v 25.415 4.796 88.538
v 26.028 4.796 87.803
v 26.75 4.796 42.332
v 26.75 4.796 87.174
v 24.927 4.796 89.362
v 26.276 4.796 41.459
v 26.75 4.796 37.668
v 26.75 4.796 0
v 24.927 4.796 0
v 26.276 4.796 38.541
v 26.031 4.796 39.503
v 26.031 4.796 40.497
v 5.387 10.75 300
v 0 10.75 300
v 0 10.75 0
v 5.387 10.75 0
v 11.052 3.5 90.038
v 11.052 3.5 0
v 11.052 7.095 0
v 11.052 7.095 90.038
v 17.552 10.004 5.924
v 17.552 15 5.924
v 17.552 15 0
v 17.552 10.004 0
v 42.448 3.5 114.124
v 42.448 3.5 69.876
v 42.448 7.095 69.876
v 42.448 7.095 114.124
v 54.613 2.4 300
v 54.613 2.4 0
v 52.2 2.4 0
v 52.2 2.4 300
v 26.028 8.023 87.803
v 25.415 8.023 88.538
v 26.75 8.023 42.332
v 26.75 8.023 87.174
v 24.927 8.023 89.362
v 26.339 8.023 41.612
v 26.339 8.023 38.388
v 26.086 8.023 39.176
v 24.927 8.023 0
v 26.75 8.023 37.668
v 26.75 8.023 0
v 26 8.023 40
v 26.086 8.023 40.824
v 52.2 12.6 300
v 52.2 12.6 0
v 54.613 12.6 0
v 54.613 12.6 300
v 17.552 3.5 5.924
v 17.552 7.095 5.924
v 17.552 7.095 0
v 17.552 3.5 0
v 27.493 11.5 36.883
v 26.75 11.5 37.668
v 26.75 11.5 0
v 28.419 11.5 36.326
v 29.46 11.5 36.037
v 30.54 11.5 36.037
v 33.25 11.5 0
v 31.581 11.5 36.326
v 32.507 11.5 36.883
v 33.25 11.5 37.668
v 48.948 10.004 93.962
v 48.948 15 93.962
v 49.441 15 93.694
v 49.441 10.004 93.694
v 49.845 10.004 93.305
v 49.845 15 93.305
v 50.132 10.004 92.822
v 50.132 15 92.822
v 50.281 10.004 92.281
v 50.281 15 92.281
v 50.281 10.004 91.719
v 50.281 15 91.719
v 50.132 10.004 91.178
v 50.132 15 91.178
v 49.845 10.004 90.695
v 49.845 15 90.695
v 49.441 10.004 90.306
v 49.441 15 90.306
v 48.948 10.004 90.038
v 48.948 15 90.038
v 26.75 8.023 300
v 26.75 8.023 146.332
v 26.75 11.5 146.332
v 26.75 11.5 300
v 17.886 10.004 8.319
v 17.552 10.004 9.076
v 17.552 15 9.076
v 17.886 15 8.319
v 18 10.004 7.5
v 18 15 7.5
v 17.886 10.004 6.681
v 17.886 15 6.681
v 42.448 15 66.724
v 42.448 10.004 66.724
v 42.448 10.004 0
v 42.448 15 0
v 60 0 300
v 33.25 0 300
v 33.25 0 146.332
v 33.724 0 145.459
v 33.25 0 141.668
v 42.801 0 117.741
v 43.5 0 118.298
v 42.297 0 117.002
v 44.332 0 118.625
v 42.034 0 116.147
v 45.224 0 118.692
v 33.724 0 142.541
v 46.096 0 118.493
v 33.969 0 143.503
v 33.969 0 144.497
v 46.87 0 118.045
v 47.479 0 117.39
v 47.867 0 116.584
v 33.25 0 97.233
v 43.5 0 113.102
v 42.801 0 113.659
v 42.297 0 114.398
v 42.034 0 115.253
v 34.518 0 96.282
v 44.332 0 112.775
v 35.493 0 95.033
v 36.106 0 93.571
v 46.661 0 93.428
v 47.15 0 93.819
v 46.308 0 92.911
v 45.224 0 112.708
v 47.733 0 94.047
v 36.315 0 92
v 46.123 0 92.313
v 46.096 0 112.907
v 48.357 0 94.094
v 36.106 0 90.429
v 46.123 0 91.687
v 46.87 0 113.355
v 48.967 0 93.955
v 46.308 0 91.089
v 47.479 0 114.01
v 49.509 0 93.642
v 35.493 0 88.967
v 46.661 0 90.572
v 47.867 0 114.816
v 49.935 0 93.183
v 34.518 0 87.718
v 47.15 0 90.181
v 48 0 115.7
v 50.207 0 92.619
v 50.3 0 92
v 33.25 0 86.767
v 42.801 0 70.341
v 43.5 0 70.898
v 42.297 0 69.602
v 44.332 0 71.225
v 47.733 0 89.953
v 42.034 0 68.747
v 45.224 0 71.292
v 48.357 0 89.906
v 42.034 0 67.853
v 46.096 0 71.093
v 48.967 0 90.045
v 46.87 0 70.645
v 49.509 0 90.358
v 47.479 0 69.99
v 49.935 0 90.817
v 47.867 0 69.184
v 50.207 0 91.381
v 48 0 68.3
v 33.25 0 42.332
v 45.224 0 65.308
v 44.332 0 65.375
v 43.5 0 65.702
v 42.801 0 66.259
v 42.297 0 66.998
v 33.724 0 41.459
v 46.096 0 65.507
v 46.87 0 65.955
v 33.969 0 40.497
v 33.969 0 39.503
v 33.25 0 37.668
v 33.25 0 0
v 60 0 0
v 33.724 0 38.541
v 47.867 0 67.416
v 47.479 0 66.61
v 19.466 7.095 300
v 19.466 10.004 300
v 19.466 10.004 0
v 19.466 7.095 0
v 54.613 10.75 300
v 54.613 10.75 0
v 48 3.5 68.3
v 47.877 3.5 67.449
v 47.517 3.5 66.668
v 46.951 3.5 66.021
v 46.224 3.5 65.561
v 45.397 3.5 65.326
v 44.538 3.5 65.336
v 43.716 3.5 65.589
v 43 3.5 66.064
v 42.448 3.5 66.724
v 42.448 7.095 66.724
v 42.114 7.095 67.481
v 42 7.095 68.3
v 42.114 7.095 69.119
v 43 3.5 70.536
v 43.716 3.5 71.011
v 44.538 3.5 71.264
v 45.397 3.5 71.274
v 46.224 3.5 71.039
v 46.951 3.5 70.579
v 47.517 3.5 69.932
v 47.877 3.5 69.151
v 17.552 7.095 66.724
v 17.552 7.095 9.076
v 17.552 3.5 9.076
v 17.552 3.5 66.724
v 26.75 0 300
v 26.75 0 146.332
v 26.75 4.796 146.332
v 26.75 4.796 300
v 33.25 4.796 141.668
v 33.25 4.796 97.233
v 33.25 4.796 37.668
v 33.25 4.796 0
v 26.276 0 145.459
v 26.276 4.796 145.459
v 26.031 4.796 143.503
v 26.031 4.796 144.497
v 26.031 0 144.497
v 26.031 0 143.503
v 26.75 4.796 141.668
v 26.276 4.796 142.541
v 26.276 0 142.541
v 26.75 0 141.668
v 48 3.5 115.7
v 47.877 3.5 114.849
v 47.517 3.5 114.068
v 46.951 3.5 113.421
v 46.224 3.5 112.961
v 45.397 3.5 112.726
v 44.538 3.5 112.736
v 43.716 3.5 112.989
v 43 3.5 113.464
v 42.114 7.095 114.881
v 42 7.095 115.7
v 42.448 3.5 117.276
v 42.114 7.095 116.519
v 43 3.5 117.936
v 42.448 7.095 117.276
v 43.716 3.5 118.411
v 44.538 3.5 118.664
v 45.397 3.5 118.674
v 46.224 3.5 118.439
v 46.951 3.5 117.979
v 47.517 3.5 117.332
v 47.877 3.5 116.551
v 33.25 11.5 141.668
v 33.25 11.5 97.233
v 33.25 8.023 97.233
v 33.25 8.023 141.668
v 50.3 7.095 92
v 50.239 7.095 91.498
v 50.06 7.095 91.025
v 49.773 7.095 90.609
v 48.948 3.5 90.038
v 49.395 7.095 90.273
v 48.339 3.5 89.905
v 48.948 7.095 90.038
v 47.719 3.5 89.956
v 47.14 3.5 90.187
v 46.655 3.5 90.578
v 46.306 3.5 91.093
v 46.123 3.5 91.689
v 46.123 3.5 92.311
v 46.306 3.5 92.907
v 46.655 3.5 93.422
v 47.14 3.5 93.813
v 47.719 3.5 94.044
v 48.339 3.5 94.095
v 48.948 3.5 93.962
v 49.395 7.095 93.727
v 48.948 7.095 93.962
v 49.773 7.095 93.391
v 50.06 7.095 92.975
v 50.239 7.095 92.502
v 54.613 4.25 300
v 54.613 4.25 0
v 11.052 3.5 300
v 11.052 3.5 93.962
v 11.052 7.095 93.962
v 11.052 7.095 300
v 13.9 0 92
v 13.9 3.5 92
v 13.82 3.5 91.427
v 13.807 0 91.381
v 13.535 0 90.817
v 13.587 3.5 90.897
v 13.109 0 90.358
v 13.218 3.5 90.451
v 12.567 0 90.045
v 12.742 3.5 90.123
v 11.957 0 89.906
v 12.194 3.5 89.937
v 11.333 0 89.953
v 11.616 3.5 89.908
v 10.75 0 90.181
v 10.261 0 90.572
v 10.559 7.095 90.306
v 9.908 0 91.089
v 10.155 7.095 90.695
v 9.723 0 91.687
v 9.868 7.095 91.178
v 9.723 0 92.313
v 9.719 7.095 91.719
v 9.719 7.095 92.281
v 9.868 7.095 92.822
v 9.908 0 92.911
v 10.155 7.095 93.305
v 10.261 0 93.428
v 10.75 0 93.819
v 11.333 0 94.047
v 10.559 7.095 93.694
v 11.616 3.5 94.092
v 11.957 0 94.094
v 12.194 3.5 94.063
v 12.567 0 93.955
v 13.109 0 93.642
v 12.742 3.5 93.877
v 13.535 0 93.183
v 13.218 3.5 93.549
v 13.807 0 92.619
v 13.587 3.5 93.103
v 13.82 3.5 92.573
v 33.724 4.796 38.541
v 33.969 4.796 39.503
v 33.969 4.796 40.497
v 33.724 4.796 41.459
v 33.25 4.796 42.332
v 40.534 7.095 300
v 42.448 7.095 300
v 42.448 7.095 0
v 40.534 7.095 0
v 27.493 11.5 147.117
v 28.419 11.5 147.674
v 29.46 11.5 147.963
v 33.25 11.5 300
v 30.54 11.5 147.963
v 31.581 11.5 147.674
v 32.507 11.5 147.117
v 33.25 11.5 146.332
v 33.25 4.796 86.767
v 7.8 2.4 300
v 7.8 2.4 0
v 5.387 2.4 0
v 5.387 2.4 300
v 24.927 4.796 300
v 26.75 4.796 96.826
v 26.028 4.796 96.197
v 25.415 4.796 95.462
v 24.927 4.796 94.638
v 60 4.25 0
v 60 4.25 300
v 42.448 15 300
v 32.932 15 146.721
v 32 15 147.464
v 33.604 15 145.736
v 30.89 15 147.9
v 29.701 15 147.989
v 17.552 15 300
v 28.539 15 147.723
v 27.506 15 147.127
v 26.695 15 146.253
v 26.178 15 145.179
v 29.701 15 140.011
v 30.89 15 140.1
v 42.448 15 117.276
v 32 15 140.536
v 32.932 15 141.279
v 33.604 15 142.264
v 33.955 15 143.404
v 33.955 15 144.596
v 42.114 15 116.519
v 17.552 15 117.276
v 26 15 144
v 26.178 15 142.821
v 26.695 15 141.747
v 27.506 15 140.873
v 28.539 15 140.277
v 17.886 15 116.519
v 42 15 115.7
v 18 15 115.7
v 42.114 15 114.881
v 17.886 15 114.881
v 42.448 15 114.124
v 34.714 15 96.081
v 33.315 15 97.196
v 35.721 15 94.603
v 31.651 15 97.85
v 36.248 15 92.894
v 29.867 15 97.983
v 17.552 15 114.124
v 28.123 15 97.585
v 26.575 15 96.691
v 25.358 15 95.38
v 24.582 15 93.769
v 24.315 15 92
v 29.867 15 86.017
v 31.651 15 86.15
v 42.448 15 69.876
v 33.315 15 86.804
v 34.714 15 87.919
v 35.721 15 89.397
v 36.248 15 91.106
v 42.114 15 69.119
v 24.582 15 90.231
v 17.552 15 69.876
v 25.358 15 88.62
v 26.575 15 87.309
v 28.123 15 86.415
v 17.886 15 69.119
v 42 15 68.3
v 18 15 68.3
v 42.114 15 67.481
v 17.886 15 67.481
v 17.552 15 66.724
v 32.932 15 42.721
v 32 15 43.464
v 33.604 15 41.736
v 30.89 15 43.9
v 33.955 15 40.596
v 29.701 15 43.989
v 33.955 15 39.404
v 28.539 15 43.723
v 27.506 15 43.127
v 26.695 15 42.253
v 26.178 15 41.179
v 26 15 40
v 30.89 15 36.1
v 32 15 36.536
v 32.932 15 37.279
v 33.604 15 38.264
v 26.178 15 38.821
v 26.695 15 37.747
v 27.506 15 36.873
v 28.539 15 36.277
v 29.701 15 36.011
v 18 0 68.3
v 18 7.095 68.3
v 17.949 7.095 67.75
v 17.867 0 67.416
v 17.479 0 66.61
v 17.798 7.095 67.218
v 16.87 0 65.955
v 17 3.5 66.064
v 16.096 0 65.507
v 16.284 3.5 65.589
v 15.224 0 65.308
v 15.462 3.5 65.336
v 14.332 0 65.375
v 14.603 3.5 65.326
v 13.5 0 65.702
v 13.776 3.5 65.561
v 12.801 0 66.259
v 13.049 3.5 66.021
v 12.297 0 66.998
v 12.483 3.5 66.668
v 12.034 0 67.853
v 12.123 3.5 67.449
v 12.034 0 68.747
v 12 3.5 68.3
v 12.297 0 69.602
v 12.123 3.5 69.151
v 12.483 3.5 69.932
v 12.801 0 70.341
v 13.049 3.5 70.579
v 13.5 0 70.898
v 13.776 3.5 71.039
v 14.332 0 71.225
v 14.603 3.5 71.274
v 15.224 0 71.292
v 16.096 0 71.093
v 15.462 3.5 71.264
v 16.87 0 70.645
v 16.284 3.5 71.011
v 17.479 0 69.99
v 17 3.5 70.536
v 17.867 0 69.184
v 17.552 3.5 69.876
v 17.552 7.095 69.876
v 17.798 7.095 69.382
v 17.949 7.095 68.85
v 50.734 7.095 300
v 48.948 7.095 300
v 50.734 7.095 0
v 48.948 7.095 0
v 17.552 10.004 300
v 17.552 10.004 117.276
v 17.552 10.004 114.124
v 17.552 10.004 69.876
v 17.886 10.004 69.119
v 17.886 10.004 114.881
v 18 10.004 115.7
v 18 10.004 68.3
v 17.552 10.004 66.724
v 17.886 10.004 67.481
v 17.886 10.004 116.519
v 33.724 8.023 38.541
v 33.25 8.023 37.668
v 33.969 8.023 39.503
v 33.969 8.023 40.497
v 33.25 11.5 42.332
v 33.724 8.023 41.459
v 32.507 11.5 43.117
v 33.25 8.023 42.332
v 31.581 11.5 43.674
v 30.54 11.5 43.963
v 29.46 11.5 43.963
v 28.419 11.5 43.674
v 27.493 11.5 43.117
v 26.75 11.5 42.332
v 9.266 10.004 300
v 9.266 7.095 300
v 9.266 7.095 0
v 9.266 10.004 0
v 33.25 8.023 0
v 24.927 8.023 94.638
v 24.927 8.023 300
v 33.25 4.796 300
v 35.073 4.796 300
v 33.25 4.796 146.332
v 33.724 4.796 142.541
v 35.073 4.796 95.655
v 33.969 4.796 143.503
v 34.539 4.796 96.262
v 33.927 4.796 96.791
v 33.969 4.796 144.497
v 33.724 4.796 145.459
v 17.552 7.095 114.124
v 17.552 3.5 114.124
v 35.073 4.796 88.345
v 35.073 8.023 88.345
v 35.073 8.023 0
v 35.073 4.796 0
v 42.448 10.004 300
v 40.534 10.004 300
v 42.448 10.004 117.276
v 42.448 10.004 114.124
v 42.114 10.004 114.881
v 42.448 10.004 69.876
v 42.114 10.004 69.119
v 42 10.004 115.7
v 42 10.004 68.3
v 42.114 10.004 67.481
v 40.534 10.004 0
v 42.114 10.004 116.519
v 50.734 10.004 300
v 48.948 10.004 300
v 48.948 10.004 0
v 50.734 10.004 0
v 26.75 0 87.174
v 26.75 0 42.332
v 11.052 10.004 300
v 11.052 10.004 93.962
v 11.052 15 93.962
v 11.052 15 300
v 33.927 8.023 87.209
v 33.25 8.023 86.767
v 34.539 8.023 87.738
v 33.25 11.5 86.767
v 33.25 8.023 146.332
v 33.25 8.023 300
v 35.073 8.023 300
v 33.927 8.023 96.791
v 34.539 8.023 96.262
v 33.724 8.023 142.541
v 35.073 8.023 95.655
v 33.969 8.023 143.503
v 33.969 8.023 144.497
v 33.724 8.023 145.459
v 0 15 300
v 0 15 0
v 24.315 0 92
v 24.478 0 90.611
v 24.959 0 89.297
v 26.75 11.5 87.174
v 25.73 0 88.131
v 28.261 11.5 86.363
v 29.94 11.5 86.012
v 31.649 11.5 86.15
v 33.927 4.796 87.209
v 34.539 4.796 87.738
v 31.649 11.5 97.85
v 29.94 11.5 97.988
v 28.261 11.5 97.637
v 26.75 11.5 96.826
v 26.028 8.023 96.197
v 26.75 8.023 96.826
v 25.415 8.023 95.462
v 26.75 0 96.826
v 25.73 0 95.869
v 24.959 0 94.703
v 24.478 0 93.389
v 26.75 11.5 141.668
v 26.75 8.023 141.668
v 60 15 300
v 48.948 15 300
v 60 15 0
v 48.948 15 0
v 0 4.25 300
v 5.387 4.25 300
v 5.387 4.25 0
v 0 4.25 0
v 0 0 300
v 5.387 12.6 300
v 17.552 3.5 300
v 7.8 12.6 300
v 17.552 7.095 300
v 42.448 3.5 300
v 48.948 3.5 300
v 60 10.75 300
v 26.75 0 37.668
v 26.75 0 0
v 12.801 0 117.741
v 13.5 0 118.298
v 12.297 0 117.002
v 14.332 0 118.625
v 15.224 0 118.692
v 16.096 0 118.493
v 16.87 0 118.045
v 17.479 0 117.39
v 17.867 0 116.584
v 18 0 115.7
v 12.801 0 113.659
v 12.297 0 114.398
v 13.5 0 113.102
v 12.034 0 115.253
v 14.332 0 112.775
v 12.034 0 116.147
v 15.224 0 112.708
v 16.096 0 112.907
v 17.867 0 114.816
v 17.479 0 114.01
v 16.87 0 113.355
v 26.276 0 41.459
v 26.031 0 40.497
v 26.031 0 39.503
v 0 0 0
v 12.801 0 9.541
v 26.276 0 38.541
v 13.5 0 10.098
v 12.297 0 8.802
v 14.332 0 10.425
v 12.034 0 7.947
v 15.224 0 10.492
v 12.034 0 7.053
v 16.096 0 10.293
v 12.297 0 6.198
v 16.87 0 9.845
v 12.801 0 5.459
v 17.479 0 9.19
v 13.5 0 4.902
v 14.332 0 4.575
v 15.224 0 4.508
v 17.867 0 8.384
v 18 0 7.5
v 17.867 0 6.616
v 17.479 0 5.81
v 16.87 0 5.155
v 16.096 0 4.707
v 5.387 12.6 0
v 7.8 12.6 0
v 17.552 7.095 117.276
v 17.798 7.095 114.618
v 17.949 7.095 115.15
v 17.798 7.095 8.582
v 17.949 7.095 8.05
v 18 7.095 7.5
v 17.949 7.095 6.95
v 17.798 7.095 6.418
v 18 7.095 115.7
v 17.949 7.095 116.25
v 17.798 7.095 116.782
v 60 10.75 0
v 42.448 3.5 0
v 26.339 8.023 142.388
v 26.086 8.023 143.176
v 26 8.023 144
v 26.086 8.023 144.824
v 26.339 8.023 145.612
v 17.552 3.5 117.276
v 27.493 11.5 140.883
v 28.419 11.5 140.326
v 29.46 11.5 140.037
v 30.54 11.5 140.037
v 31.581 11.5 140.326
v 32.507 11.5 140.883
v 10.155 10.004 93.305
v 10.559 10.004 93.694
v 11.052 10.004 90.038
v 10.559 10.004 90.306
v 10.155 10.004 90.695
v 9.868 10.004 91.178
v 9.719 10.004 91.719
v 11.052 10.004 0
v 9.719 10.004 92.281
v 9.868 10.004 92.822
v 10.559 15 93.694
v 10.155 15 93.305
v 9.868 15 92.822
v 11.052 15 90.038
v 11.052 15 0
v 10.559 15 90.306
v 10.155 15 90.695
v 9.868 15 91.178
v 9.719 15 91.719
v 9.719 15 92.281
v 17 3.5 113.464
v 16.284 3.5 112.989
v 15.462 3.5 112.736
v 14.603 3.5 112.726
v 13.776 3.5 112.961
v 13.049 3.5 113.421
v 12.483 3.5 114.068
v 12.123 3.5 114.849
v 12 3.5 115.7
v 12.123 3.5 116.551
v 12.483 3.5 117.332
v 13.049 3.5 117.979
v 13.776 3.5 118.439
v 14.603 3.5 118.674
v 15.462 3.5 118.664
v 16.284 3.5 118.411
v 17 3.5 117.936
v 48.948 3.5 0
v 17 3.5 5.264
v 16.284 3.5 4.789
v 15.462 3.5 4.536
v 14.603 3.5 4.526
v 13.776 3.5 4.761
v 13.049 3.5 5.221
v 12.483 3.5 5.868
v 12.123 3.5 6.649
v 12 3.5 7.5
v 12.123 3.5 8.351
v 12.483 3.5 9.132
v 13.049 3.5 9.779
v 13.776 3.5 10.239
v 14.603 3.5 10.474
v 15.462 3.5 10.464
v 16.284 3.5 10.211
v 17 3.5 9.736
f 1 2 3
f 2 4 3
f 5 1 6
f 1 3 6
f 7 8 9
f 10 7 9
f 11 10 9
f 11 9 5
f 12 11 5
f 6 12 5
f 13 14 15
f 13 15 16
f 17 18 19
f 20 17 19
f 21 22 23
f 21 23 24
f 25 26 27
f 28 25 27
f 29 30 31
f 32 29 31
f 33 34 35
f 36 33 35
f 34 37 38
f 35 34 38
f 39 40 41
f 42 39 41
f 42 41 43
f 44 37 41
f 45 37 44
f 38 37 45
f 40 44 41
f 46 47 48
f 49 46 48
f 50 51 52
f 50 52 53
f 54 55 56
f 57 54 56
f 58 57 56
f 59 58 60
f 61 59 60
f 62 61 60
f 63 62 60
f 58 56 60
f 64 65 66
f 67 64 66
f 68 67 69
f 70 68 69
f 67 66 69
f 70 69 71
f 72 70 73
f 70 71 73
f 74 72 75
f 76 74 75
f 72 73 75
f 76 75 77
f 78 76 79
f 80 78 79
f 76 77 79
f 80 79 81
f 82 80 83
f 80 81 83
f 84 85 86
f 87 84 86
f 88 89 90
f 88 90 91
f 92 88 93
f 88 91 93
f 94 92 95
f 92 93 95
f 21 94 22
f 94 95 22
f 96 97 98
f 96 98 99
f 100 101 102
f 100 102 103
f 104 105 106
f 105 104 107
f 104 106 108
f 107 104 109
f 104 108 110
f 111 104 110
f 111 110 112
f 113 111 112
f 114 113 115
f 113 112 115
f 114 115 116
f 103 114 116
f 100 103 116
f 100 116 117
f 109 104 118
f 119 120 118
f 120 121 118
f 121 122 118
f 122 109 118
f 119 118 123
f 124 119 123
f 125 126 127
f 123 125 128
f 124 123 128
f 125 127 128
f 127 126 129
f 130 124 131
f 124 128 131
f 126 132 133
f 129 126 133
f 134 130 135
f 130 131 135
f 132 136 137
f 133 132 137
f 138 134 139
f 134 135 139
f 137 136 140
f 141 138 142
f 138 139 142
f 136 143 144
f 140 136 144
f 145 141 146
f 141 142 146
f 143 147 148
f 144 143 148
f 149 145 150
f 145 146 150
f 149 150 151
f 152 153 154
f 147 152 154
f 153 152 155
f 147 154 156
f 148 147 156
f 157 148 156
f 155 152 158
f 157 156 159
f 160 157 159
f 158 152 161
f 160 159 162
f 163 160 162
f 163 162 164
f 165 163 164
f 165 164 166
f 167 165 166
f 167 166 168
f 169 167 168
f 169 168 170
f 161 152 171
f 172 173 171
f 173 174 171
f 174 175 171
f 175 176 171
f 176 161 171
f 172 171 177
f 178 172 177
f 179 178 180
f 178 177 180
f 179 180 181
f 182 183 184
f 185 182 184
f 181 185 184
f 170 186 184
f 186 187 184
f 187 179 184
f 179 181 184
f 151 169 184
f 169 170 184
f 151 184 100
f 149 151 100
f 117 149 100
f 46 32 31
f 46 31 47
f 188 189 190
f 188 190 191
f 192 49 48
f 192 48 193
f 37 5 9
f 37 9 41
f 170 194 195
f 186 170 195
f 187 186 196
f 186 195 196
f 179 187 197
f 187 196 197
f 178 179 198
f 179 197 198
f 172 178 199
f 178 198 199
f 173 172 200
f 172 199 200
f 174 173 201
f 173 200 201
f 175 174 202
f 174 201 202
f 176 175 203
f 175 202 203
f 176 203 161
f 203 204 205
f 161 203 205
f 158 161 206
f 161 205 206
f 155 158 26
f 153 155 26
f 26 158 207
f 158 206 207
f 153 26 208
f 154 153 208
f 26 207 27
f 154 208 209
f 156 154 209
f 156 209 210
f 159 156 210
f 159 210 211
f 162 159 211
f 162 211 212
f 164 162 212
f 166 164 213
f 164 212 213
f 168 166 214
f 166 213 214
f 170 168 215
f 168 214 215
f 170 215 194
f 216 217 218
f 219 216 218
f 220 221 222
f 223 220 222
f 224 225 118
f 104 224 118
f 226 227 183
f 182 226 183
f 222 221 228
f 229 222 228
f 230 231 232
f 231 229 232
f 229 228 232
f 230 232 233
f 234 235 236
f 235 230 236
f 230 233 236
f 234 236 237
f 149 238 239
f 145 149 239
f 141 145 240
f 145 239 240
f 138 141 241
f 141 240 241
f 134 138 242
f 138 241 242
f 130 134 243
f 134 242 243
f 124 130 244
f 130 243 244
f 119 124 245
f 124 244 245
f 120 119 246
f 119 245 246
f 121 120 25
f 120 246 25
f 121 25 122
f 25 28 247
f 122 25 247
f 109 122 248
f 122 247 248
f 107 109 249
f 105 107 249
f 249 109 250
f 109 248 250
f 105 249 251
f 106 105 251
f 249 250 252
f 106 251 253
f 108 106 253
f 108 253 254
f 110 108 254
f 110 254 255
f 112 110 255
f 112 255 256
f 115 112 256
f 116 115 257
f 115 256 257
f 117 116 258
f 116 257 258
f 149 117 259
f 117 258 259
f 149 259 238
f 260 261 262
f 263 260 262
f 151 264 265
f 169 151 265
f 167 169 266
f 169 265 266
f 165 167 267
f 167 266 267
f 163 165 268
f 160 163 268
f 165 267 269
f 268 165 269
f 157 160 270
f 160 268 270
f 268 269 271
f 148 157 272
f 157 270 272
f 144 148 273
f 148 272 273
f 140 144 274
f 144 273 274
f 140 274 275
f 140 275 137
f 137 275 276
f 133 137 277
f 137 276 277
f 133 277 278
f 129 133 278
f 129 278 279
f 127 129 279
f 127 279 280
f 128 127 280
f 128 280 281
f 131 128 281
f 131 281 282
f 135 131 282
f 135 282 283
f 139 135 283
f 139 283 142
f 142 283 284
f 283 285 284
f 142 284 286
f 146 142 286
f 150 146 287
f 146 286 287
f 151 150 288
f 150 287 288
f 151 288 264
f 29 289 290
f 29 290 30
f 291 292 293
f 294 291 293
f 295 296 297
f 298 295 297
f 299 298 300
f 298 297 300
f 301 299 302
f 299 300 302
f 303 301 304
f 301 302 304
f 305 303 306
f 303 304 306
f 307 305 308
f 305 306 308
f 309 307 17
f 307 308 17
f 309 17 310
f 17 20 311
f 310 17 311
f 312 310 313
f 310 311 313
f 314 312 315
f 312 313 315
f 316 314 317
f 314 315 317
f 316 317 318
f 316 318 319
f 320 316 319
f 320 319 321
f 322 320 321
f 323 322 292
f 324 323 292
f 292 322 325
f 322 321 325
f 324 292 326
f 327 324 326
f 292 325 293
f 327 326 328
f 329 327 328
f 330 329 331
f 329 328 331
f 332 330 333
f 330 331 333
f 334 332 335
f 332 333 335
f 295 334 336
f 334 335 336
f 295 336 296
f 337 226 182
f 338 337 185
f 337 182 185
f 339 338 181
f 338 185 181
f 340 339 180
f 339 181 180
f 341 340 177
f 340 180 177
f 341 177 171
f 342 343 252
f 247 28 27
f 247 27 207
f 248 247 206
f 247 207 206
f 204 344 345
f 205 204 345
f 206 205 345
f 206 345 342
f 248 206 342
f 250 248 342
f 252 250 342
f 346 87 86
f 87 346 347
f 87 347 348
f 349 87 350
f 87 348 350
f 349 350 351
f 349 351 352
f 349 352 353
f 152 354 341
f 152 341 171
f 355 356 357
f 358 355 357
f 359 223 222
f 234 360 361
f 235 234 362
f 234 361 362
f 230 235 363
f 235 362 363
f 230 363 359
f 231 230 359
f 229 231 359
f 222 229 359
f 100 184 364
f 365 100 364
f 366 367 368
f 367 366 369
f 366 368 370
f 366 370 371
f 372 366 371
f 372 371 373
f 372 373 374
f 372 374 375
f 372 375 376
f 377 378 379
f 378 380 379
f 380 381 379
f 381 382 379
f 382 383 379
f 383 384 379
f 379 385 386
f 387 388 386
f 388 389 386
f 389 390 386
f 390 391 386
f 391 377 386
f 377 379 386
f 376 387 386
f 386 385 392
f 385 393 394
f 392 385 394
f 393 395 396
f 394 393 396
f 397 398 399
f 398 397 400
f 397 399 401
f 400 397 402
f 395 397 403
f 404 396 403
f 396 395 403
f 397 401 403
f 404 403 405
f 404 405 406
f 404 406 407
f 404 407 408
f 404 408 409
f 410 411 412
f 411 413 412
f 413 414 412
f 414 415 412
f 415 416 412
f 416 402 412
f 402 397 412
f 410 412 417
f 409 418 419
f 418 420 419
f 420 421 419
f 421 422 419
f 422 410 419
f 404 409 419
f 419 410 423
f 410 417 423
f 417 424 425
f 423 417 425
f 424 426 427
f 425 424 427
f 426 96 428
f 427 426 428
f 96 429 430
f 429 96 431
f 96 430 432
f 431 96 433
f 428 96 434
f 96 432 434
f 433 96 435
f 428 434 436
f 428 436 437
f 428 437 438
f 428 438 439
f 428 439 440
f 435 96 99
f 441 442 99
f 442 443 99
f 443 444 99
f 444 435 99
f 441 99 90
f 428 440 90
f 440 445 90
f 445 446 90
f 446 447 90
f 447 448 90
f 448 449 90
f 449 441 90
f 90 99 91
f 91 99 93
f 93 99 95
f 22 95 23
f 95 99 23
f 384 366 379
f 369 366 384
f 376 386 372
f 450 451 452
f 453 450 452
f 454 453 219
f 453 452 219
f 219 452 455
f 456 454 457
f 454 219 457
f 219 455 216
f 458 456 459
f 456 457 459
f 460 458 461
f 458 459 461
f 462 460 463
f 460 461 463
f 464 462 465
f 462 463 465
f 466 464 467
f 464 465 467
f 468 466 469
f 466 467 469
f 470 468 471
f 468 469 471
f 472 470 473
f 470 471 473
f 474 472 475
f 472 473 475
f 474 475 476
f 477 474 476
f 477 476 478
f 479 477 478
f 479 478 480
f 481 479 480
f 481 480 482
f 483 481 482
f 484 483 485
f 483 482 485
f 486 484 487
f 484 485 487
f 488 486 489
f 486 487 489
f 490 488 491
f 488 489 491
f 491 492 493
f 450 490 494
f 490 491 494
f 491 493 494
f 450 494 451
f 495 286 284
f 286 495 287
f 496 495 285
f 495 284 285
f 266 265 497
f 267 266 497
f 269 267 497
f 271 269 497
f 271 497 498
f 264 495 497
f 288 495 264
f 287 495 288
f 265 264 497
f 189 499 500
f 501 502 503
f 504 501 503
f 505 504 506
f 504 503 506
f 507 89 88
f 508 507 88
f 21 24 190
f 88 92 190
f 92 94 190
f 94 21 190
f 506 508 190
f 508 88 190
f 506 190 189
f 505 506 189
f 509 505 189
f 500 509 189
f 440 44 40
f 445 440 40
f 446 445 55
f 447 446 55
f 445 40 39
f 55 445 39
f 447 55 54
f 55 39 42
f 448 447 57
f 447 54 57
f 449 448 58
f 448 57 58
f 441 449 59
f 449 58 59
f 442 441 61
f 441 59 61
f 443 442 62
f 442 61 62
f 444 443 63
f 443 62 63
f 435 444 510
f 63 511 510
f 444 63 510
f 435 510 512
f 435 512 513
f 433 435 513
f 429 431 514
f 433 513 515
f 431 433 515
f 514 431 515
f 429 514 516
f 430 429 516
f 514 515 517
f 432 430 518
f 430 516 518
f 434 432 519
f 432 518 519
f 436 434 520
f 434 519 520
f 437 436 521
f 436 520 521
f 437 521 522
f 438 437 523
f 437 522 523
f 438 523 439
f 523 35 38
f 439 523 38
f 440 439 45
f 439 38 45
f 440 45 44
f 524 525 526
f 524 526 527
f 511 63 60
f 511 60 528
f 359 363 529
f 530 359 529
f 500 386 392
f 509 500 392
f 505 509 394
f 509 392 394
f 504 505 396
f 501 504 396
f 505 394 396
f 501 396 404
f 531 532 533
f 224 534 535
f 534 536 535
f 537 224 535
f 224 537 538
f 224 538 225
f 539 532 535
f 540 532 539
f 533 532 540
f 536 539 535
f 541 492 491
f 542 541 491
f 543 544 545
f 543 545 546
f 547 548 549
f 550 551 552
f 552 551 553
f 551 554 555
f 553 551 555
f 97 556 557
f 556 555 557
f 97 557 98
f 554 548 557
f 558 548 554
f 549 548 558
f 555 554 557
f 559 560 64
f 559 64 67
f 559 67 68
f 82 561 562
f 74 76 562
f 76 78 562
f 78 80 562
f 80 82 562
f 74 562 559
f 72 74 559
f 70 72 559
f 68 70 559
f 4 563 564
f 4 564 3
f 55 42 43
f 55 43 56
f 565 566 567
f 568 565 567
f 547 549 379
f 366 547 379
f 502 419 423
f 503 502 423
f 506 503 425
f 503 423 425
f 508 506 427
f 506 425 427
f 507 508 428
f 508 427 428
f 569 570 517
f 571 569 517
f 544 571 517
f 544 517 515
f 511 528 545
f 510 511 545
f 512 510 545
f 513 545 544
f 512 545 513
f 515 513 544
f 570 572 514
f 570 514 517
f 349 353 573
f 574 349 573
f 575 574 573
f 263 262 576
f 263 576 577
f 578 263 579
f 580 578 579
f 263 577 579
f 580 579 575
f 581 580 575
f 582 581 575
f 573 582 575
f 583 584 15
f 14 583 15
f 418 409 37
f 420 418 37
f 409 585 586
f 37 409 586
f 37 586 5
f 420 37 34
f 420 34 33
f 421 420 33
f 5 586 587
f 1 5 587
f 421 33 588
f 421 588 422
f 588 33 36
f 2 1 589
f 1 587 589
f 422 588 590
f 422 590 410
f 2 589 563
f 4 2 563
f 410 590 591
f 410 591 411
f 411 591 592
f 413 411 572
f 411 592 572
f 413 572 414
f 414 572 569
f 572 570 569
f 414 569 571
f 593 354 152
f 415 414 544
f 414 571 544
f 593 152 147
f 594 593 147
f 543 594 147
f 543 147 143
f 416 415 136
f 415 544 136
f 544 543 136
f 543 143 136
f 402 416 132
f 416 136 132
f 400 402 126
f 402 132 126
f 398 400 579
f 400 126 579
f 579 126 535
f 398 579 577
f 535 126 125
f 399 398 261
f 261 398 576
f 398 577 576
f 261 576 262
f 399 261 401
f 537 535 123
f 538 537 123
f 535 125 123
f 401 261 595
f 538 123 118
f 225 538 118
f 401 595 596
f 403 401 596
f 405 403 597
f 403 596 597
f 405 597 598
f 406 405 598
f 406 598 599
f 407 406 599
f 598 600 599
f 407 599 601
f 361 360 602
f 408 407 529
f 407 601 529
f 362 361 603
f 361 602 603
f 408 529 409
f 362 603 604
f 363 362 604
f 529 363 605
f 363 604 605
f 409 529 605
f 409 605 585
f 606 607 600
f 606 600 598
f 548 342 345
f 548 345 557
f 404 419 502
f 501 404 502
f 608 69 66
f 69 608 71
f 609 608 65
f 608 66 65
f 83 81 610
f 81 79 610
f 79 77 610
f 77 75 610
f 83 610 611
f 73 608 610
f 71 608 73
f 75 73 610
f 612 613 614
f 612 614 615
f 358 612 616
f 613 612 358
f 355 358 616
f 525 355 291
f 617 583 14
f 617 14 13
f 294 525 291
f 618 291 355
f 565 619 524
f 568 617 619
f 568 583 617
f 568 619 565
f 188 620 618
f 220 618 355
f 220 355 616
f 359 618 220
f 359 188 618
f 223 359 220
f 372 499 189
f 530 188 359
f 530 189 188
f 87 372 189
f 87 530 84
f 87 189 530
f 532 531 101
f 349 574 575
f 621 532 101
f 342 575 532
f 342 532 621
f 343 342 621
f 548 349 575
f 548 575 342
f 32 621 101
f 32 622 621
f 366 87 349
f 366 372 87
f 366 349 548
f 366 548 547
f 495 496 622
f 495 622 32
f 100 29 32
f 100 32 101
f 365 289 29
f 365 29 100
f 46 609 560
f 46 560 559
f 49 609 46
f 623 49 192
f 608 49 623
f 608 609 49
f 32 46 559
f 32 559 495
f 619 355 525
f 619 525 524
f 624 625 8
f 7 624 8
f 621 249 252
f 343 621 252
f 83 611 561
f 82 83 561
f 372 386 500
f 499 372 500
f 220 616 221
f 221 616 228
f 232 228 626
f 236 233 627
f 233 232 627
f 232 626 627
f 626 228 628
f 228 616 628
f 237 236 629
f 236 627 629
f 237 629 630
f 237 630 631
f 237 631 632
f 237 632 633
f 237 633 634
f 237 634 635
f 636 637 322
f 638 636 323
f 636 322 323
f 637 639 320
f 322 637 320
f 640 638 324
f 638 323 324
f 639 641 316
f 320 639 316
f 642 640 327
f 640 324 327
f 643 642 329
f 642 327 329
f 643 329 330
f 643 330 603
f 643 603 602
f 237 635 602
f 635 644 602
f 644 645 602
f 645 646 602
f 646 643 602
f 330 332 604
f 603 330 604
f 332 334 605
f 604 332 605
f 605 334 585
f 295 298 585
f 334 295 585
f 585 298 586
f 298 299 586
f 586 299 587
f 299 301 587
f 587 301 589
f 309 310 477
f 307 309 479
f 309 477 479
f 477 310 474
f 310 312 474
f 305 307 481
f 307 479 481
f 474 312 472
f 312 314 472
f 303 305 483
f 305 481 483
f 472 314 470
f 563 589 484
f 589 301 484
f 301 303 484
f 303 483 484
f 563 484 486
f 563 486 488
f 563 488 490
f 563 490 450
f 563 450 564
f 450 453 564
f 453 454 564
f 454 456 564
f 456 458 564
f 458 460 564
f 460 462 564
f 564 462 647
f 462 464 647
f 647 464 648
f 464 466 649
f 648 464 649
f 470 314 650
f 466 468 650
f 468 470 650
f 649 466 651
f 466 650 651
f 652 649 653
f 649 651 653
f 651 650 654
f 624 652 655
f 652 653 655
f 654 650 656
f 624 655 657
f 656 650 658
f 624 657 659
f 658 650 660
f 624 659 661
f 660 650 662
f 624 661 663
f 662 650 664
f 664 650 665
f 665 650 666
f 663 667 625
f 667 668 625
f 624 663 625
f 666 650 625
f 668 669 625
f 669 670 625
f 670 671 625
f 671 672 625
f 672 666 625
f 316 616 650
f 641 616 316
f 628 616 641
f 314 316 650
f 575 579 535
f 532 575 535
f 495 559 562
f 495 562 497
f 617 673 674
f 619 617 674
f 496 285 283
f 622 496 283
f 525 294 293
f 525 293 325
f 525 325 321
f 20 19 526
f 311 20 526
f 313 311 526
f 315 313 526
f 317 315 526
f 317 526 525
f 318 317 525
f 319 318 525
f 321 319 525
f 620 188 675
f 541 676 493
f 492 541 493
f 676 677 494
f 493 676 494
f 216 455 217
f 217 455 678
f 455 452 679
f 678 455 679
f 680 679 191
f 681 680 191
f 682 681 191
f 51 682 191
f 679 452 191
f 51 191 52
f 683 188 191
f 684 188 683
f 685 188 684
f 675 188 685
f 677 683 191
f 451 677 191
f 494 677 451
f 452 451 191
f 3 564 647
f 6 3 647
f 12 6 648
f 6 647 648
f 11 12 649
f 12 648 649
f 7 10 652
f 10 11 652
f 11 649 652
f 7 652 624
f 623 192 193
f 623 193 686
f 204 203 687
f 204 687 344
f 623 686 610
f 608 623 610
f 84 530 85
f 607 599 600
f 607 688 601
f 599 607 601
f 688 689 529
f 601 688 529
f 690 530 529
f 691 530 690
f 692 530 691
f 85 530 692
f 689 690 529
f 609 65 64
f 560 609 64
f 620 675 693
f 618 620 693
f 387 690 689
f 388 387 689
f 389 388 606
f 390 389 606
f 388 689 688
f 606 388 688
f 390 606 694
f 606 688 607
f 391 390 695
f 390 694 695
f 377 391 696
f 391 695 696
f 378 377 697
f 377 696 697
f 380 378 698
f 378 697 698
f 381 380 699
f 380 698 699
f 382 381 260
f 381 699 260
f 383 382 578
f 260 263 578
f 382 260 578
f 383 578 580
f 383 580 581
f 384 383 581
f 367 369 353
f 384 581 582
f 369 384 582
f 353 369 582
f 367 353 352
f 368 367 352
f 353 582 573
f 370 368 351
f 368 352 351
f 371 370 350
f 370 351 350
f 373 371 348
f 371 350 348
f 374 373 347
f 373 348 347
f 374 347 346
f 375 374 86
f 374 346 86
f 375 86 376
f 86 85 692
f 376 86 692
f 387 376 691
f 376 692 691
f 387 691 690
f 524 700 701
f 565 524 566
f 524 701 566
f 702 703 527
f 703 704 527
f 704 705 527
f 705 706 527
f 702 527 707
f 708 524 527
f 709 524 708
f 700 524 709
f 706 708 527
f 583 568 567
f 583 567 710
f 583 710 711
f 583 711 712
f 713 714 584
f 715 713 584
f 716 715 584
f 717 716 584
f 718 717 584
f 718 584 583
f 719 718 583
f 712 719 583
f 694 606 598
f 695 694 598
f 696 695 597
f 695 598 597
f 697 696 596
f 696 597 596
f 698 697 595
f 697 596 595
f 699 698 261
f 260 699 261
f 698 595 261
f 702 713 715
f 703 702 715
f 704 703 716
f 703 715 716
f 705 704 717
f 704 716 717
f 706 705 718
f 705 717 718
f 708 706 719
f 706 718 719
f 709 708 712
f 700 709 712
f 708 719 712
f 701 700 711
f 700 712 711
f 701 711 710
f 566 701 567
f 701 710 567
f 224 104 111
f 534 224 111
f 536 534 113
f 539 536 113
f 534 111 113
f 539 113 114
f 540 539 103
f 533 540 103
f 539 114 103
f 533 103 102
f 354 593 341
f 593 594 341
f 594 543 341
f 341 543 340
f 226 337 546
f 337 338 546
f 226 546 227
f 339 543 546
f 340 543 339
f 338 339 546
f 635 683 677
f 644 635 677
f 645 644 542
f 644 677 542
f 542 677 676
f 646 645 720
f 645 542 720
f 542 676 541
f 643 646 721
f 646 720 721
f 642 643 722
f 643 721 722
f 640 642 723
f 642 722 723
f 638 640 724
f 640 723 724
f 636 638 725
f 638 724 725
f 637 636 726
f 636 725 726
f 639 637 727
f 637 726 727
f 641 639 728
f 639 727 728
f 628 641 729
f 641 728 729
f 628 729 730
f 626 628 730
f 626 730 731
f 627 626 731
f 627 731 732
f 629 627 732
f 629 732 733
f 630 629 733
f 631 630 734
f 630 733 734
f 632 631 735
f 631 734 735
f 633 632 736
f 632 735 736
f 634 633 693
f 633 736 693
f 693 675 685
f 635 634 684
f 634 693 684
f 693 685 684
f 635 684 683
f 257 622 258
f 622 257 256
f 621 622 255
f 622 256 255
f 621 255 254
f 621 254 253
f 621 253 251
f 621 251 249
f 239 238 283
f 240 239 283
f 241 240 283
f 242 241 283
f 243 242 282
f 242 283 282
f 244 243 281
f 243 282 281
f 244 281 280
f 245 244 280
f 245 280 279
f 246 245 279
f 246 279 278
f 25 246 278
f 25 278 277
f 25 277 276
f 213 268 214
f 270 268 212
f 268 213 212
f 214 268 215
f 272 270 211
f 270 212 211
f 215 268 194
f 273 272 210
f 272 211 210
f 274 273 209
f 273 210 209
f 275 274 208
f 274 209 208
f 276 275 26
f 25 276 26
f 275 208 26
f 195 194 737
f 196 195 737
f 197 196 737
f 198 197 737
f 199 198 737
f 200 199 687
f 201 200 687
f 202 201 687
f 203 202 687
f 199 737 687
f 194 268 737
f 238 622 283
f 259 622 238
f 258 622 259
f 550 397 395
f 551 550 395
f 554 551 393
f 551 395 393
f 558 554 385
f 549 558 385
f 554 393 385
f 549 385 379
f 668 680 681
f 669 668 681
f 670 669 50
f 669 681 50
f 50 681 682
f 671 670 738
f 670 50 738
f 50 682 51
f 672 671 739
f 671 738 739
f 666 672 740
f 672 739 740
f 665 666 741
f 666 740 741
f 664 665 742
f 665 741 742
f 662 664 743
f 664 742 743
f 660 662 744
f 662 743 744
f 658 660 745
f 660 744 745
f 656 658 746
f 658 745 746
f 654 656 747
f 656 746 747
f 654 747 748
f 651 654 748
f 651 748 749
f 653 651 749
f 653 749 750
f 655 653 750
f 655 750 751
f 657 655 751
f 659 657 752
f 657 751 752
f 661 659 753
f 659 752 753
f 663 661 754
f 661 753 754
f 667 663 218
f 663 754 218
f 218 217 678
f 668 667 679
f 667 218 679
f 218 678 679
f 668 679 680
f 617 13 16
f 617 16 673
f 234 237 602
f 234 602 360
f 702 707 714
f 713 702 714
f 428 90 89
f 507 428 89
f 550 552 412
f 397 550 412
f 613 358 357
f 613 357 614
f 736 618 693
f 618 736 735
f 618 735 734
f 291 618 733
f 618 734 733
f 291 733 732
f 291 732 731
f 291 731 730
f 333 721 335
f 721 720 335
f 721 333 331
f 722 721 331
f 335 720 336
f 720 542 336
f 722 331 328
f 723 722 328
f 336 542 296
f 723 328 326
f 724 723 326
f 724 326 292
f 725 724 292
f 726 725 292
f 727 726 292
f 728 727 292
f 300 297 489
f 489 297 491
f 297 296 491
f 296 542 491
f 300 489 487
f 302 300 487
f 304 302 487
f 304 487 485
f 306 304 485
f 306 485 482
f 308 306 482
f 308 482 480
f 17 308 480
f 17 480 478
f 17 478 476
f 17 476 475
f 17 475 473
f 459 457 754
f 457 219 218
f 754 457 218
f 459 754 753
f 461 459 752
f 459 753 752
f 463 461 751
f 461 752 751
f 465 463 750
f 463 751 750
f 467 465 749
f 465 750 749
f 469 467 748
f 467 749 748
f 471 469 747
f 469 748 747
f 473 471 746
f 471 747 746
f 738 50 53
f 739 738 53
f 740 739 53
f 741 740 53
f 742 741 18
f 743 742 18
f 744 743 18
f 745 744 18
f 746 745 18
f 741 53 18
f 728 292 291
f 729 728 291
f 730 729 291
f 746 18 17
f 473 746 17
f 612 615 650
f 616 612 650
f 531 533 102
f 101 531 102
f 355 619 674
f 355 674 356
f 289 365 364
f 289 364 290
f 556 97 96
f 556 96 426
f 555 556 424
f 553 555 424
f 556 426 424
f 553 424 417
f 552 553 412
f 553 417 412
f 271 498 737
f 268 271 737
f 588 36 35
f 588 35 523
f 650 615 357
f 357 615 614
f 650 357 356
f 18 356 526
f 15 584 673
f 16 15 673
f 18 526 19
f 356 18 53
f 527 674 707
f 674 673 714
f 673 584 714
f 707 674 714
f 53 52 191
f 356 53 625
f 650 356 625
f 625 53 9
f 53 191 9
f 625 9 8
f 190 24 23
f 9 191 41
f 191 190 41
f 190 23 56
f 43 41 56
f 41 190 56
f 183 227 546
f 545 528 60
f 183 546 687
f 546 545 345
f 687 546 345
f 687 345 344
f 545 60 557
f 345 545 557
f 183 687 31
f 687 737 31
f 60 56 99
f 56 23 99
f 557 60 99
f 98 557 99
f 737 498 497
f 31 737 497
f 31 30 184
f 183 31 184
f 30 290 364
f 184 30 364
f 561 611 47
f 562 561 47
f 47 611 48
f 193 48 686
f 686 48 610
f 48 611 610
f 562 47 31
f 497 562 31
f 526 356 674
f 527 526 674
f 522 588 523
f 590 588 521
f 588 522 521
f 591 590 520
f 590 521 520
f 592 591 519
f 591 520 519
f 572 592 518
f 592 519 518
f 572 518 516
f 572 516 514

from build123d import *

# Parameters (mm, degrees)
EXTRUDE_1_DEPTH         = 300
HOLE_WIZARD_12_0_12_1_D = 12
HOLE_WIZARD_8_0_8_1_D   = 8
HOLE_WIZARD_6_0_6_2_D   = 6
HOLE_WIZARD_M5_1_D      = 4.2


with BuildPart() as part:
    # 草图1 → 凸台-拉伸1 (new body)
    with BuildSketch(Plane.XY):
        Polygon((0, 0), (26.75, 0), (26.75, 4.796419132), (24.926505169, 4.796419132), (24.926505169, 8.023402897), (26.75, 8.023402897), (26.75, 11.5), (30, 11.5), (33.25, 11.5), (33.25, 8.023402897), (35.073494831, 8.023402897), (35.073494831, 4.796419132), (33.25, 4.796419132), (33.25, 0), (60, 0), (60, 4.25), (54.613325713, 4.25), (54.613325713, 2.4), (52.2, 2.4), (52.2, 12.6), (54.613325713, 12.6), (54.613325713, 10.75), (60, 10.75), (60, 15), (48.947608979, 15), (48.947608979, 10.003848618), (50.733802833, 10.003848618), (50.733802833, 7.094693738), (48.947608979, 7.094693738), (48.947608979, 3.5), (42.447608979, 3.5), (42.447608979, 7.094693738), (40.533802833, 7.094693738), (40.533802833, 10.003848618), (42.447608979, 10.003848618), (42.447608979, 15), (30, 15), (17.552391021, 15), (17.552391021, 10.003848618), (19.466197167, 10.003848618), (19.466197167, 7.094693738), (17.552391021, 7.094693738), (17.552391021, 3.5), (11.052391021, 3.5), (11.052391021, 7.094693738), (9.266197167, 7.094693738), (9.266197167, 10.003848618), (11.052391021, 10.003848618), (11.052391021, 15), (0, 15), (0, 10.75), (5.386674287, 10.75), (5.386674287, 12.6), (7.8, 12.6), (7.8, 2.4), (5.386674287, 2.4), (5.386674287, 4.25), (0, 4.25), align=None)
    extrude(amount=EXTRUDE_1_DEPTH)

    # Ø12.0 (12) 直径孔1 (through all)
    with Locations(Plane(origin=(0, 15, 0), x_dir=(1, 0, 0), z_dir=(0, 1, 0))):
        with Locations((30.31545922, -92)):
            Hole(HOLE_WIZARD_12_0_12_1_D / 2)

    # Ø8.0 (8) 直径孔1 (through all)
    with Locations(Plane(origin=(0, 15, 0), x_dir=(1, 0, 0), z_dir=(0, 1, 0))):
        with Locations((30, -40), (30, -144)):
            Hole(HOLE_WIZARD_8_0_8_1_D / 2)

    # Ø6.0 (6) 直径孔2 (through all)
    with Locations(Plane(origin=(0, 0, 0), x_dir=(-1, 0, 0), z_dir=(0, -1, 0))):
        with Locations((-15, -7.5), (-15, -68.3), (-15, -115.7), (-45, -68.3), (-45, -115.7)):
            Hole(HOLE_WIZARD_6_0_6_2_D / 2)

    # M5 螺纹孔的螺纹孔钻头1 (through all)
    with Locations(Plane(origin=(0, 0, 0), x_dir=(-1, 0, 0), z_dir=(0, -1, 0))):
        with Locations((-48.2, -92), (-11.8, -92)):
            Hole(HOLE_WIZARD_M5_1_D / 2)


solid = part.part
